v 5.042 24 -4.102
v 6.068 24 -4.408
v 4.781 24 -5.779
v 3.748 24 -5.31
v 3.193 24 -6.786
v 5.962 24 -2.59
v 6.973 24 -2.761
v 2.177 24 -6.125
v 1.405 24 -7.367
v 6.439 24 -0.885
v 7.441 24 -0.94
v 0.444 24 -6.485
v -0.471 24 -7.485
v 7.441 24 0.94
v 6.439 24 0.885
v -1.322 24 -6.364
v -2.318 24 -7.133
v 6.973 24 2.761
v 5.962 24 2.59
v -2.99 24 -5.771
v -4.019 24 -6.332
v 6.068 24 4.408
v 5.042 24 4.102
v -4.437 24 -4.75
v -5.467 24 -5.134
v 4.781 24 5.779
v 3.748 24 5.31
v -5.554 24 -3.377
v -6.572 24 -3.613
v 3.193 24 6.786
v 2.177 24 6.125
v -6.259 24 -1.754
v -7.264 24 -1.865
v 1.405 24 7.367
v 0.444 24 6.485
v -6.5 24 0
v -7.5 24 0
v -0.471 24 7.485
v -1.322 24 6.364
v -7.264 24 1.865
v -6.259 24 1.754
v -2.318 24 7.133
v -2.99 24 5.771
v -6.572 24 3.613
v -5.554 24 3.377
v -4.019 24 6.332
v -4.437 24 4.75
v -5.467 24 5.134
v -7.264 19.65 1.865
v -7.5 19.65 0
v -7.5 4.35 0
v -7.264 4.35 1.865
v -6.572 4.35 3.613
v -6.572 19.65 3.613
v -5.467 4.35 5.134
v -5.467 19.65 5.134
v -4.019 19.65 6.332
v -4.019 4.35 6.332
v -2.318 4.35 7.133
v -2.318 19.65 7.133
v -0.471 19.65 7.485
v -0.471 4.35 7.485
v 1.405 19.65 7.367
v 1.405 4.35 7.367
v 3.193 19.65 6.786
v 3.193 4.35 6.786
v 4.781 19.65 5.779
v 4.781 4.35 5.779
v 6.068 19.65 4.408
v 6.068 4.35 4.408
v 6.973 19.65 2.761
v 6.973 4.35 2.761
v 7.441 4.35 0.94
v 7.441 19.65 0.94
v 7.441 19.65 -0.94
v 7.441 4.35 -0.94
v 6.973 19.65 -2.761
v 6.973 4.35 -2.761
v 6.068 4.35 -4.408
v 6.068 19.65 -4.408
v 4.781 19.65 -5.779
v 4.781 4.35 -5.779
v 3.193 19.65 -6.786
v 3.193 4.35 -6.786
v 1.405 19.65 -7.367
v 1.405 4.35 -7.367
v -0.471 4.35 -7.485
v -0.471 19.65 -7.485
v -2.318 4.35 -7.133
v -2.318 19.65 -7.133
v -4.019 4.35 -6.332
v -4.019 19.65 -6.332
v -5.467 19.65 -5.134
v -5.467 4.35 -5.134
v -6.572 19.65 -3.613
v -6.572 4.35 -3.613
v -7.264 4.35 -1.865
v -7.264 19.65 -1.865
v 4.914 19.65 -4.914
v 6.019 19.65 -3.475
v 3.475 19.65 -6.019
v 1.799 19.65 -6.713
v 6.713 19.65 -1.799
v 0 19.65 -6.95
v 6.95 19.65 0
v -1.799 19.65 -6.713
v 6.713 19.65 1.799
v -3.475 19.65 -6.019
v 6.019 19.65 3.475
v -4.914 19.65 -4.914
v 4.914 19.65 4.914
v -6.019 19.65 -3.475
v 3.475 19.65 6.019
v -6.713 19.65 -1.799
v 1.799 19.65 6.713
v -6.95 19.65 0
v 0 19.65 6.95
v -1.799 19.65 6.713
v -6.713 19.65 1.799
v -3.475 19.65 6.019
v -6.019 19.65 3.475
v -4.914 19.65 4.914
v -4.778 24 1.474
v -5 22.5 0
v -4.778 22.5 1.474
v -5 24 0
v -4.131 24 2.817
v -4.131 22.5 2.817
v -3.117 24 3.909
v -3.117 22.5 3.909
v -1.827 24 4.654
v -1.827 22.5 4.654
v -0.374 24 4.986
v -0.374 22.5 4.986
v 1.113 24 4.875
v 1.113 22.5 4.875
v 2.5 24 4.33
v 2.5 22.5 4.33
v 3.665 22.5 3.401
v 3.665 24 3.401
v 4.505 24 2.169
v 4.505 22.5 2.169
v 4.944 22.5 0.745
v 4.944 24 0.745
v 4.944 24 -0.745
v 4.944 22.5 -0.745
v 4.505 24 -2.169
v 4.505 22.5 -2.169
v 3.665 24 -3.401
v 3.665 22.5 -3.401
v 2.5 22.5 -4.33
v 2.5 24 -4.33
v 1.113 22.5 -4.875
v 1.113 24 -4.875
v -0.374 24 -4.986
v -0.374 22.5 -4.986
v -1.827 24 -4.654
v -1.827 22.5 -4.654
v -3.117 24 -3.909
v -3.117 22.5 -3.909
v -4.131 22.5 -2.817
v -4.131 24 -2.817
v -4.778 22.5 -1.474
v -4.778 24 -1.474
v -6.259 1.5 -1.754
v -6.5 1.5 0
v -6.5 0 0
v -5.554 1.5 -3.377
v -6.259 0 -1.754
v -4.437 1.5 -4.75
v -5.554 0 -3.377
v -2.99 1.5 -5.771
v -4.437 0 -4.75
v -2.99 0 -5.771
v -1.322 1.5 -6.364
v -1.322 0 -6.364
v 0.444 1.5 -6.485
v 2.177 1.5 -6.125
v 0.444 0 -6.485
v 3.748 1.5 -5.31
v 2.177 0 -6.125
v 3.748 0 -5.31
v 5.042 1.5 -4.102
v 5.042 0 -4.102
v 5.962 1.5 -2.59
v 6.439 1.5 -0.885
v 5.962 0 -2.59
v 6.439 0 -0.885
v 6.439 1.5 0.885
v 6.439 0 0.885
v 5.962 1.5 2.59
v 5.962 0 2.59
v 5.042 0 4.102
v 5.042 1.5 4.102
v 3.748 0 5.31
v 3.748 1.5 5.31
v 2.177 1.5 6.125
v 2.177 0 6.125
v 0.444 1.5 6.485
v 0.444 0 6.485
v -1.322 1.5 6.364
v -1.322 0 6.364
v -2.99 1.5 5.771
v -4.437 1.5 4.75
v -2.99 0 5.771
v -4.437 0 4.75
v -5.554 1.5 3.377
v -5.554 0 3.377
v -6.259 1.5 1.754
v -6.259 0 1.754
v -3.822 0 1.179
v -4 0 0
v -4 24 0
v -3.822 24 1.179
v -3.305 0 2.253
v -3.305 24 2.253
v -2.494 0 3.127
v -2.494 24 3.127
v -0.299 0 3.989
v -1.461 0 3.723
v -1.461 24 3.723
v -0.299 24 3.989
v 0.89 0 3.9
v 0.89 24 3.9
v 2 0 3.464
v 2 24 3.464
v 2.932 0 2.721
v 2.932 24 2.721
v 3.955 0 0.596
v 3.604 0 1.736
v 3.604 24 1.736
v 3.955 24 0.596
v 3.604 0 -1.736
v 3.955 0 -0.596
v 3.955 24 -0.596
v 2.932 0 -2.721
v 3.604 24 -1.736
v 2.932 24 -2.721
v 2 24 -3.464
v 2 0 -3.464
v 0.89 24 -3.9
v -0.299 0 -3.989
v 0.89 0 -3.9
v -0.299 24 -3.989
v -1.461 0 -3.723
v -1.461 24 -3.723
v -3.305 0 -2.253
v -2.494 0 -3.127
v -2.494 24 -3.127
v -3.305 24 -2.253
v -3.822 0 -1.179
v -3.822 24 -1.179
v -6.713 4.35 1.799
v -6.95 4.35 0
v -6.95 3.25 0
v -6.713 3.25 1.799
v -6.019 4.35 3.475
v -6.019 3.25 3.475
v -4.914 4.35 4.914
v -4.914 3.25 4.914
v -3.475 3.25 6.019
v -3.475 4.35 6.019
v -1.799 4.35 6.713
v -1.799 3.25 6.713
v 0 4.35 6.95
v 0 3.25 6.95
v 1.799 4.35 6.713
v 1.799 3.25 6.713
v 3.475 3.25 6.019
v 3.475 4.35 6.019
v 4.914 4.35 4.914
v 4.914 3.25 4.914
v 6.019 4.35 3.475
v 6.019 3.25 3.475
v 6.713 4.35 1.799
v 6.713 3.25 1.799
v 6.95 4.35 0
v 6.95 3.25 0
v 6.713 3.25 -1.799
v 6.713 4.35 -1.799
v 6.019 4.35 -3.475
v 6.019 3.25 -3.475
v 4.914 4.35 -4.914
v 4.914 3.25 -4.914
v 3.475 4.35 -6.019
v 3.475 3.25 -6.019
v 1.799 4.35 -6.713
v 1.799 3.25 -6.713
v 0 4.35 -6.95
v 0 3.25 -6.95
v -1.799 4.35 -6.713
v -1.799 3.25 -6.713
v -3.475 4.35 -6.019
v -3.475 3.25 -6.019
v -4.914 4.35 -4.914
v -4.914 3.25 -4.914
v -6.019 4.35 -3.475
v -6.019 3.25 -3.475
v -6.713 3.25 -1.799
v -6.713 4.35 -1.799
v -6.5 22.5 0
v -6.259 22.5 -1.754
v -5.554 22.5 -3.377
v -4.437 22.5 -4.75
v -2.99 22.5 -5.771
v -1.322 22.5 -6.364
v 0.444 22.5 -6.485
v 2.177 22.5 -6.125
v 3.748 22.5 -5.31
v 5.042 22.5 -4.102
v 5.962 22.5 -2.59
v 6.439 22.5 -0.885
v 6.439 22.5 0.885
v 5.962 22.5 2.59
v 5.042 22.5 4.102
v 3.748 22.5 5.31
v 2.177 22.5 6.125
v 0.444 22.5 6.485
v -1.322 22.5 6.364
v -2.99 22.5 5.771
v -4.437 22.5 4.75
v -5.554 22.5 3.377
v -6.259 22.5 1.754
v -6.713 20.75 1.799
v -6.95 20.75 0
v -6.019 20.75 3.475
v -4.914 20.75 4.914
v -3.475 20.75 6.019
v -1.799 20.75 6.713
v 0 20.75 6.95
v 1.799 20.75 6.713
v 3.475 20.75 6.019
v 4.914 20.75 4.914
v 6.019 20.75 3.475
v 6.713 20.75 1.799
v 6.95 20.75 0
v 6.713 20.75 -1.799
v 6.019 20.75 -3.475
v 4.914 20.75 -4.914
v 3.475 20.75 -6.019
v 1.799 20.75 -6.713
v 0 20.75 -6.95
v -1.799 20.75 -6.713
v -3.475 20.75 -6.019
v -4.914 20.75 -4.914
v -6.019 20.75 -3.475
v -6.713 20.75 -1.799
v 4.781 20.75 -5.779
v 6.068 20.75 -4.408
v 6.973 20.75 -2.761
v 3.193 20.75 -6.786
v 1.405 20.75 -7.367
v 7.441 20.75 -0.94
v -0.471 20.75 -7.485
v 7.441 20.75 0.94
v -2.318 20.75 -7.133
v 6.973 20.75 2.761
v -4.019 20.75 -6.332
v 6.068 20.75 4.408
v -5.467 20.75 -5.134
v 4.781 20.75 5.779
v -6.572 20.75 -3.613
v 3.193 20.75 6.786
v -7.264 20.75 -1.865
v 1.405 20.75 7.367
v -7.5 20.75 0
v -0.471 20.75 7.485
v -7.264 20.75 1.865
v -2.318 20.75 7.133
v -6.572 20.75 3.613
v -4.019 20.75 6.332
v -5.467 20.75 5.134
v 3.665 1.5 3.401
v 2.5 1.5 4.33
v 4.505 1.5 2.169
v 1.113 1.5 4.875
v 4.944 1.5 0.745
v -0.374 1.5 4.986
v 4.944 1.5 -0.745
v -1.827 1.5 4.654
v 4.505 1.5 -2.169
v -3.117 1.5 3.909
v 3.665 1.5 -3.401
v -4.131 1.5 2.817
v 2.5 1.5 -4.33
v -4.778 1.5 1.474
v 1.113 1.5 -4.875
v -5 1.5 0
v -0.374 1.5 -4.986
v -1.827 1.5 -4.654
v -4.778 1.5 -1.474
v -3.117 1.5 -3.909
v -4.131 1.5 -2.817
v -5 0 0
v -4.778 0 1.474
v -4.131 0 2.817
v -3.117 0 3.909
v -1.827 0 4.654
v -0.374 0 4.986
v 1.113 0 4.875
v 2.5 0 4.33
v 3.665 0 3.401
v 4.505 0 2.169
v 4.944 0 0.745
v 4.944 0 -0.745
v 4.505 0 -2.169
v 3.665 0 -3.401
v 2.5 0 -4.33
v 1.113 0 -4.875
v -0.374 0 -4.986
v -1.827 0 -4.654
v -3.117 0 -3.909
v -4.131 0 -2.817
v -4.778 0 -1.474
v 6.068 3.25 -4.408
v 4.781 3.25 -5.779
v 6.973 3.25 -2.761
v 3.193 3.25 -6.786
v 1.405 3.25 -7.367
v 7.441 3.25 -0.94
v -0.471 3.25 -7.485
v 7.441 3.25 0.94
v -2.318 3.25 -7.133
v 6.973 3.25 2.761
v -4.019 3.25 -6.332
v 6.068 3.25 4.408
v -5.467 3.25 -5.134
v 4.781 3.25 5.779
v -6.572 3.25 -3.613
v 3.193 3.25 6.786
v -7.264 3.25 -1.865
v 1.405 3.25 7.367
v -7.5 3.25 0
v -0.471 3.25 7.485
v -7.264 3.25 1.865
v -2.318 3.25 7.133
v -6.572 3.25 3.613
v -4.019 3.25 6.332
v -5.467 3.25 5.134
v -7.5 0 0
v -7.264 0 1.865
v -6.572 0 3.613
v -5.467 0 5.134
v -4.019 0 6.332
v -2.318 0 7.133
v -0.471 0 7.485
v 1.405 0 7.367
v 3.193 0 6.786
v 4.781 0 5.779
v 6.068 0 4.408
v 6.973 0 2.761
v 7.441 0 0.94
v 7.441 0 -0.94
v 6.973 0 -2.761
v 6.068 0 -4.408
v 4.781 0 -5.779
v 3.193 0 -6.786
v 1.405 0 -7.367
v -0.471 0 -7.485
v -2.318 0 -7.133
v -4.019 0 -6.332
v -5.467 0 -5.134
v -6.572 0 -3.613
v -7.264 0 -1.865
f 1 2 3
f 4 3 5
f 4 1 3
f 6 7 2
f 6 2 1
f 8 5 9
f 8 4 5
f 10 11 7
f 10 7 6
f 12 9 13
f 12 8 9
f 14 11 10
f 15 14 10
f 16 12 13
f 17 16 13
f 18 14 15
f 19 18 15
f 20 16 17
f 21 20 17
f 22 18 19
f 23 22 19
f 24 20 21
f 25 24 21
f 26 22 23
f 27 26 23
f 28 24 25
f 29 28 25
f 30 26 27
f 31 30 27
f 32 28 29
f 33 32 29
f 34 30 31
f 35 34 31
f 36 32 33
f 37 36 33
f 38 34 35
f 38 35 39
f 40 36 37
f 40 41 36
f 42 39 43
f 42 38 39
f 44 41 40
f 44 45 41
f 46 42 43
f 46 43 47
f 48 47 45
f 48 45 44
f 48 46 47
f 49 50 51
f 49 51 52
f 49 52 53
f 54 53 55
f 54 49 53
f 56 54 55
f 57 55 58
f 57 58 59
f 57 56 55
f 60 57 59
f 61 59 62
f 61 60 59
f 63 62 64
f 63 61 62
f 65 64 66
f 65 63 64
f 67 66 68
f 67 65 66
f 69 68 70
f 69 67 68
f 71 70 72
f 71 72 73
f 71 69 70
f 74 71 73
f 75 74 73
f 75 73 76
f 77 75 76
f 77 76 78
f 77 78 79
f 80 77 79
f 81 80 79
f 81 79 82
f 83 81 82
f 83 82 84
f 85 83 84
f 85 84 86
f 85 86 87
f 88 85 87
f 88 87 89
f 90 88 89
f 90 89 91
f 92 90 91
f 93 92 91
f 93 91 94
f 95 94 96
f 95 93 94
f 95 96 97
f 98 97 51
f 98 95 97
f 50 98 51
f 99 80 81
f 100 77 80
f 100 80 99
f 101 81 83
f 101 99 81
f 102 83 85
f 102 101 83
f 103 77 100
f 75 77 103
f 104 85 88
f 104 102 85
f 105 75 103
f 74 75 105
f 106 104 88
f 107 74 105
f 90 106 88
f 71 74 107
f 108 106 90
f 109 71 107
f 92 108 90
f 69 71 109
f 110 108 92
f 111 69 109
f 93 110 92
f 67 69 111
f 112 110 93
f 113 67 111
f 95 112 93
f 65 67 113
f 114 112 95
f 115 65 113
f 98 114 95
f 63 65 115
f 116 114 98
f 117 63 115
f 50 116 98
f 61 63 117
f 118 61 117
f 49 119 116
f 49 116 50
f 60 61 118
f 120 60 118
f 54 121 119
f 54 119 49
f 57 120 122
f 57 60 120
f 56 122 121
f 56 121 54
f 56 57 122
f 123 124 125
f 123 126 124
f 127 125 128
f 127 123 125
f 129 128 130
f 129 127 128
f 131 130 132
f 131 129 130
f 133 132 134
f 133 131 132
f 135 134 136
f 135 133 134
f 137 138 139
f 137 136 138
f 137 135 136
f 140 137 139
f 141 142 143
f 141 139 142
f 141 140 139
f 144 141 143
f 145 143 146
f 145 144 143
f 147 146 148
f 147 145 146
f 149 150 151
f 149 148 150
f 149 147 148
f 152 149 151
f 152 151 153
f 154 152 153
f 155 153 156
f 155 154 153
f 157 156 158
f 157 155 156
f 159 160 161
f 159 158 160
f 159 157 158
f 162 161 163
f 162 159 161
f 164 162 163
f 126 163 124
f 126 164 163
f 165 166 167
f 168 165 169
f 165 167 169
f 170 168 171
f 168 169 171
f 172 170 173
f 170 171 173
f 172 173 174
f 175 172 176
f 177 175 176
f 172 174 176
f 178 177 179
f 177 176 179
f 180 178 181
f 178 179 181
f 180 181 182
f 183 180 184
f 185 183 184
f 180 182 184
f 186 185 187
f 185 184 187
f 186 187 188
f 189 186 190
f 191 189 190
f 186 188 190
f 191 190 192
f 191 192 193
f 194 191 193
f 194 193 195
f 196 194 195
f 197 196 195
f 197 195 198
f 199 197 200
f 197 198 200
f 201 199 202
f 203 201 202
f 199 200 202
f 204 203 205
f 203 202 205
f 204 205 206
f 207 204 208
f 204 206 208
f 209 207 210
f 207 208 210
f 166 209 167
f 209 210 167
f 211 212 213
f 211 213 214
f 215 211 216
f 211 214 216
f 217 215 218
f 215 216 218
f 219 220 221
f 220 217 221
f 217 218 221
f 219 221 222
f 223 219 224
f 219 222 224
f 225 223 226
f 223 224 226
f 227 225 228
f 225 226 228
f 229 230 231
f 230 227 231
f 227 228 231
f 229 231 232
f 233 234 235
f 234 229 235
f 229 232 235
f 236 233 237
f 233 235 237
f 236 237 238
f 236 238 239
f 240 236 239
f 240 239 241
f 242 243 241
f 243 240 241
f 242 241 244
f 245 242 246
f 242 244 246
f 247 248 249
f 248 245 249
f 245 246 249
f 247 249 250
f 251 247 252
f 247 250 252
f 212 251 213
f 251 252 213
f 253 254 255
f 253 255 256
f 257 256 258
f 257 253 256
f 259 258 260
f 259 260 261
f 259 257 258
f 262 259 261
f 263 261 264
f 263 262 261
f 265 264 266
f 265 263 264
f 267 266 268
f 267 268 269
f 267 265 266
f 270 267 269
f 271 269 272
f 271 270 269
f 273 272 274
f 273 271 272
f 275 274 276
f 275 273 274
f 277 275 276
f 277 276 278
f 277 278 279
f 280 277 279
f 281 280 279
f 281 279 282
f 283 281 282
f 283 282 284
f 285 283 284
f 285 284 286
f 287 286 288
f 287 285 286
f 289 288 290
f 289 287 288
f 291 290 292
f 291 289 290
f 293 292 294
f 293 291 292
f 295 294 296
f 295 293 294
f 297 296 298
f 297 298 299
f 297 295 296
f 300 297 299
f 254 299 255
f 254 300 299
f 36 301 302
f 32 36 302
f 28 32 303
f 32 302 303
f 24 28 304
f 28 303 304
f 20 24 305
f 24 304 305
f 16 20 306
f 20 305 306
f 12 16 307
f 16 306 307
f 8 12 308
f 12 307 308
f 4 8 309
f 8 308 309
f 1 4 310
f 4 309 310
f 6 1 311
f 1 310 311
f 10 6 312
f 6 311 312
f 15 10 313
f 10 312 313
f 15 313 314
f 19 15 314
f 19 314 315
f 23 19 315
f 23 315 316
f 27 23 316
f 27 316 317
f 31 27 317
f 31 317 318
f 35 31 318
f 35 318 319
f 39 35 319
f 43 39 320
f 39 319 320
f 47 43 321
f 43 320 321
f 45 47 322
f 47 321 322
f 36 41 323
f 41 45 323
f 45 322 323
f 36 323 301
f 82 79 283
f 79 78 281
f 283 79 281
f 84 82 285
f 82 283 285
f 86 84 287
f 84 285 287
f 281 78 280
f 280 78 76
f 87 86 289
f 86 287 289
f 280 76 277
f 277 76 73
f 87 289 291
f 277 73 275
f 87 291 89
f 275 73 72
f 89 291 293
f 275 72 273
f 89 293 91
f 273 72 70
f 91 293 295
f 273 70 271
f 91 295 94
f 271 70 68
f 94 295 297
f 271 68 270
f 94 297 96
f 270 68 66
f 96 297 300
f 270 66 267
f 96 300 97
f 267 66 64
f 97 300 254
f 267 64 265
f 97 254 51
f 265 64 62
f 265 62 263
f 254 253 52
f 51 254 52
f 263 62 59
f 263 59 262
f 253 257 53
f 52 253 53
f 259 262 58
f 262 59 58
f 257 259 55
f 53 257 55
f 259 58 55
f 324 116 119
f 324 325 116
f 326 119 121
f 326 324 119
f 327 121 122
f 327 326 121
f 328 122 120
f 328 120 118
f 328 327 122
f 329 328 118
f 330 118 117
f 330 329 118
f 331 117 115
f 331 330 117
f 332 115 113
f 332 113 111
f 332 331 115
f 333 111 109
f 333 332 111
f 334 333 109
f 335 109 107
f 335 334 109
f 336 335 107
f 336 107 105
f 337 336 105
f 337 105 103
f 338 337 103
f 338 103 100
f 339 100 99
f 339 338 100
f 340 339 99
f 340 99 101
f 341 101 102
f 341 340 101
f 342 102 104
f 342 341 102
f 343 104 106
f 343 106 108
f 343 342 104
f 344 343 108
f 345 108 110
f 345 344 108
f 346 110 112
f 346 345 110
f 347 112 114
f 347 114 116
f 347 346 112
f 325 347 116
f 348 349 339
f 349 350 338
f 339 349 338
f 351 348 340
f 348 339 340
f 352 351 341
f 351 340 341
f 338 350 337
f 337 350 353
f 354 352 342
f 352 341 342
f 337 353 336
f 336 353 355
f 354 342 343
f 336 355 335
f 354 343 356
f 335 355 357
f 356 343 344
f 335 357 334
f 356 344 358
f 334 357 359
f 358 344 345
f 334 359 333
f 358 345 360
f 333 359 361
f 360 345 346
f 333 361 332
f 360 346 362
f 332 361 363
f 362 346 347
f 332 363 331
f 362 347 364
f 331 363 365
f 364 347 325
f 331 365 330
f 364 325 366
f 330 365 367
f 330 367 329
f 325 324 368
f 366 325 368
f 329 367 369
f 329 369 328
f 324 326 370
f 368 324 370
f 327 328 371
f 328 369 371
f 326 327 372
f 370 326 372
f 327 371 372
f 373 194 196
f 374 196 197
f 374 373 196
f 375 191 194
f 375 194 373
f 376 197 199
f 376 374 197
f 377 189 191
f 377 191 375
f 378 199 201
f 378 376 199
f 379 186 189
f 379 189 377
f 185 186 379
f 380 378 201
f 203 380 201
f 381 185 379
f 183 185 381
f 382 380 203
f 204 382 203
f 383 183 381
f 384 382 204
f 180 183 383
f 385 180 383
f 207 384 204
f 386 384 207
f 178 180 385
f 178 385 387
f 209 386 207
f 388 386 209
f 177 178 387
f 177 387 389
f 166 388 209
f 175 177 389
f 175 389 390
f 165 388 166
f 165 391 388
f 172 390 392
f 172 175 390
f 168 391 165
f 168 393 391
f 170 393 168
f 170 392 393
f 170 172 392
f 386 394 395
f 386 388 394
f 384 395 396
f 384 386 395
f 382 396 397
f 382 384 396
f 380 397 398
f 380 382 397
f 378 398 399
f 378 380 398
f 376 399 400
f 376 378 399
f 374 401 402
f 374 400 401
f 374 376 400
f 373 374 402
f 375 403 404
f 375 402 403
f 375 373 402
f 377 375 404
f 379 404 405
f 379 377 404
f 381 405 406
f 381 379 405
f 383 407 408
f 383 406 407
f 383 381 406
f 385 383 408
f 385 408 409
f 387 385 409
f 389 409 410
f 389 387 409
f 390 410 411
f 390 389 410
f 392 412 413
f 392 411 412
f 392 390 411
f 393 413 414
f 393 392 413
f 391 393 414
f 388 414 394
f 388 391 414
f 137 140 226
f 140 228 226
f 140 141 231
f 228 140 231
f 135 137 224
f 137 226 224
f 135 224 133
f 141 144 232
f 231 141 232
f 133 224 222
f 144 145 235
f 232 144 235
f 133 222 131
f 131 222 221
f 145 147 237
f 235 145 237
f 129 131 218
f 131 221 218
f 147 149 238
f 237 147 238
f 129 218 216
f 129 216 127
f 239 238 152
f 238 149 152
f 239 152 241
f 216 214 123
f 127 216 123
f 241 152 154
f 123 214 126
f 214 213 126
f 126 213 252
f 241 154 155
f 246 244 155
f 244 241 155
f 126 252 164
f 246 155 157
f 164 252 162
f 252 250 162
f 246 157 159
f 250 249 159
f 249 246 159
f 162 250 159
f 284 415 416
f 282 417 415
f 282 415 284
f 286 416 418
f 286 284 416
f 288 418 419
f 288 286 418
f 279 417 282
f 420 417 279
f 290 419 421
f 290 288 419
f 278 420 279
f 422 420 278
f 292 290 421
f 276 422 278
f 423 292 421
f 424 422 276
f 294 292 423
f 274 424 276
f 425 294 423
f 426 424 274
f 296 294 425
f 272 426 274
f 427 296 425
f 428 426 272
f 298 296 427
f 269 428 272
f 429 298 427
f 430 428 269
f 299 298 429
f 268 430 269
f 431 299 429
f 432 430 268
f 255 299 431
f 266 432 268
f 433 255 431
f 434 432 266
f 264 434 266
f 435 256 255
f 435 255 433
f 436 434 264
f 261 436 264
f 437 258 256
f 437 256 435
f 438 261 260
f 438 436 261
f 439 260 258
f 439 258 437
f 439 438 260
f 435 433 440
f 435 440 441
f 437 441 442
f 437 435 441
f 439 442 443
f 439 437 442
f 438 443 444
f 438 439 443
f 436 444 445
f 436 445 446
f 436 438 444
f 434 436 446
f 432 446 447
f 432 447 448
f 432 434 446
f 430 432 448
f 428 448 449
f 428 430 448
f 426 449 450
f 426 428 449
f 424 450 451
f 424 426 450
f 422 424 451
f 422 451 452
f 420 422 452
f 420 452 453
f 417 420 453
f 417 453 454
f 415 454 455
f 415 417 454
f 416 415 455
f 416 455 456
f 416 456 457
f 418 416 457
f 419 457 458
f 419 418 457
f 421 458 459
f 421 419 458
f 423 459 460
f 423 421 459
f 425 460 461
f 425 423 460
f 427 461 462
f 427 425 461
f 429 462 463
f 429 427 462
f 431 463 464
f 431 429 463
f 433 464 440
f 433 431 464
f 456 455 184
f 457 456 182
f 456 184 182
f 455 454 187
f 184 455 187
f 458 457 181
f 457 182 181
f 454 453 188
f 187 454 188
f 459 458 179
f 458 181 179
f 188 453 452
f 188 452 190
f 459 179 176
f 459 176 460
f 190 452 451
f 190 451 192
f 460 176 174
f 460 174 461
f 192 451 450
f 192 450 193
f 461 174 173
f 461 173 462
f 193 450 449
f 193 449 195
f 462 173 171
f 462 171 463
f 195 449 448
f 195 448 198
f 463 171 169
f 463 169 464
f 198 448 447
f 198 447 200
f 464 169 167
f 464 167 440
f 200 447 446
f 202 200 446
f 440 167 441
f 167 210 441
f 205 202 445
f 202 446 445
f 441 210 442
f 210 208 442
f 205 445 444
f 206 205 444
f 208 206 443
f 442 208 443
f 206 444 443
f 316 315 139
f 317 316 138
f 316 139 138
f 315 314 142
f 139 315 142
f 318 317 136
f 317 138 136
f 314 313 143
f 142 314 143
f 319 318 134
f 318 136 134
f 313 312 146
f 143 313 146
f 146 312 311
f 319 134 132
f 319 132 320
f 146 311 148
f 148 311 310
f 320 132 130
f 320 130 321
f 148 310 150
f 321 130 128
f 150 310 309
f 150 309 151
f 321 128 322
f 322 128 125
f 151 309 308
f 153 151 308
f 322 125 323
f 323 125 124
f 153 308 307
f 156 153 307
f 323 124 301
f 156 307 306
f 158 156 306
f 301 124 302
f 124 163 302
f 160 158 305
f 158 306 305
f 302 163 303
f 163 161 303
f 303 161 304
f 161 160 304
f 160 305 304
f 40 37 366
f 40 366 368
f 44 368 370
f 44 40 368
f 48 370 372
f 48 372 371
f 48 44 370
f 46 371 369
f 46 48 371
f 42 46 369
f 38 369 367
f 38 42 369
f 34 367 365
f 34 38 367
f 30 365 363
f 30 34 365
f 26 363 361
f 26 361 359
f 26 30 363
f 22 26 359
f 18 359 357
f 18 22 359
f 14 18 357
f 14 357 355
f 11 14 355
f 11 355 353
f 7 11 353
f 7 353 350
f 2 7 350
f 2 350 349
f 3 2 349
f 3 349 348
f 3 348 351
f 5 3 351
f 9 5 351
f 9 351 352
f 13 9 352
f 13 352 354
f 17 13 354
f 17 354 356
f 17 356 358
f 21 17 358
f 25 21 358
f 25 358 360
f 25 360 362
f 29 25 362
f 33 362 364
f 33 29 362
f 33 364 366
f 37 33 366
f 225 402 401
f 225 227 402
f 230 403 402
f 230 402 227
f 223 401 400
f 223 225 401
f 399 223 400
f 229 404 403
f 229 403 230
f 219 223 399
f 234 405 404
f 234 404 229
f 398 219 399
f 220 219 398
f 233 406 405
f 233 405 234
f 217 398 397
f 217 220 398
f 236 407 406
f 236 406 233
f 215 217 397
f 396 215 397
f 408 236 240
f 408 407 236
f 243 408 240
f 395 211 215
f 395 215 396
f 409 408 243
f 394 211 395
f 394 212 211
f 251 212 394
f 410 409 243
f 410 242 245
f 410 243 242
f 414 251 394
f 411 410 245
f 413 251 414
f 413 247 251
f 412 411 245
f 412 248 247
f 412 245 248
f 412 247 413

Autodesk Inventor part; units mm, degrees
ref_plane "YZ Plane" through (0, 0, 0) normal (1, 0, 0) x (0, 1, 0)
ref_plane "XZ Plane" through (0, 0, 0) normal (0, 1, 0) x (-1, 0, 0)
ref_plane "XY Plane" through (0, 0, 0) normal (0, 0, 1) x (1, 0, 0)
sketch "Esboço1" plane through (0, 0, 0) normal (0, 0, 1) x (1, 0, 0)
  line L0 (-7.5, 0) -> (-7.5, 3.25)
  line L1 (-7.5, 3.25) -> (-6.95, 3.25)
  line L2 (-6.95, 3.25) -> (-6.95, 4.35)
  line L3 (-6.95, 4.35) -> (-7.5, 4.35)
  line L4 (-7.5, 4.35) -> (-7.5, 19.65)
  line L5 (-7.5, 19.65) -> (-6.95, 19.65)
  line L6 (-6.95, 19.65) -> (-6.95, 20.75)
  line L7 (-6.95, 20.75) -> (-7.5, 20.75)
  line L8 (-7.5, 20.75) -> (-7.5, 24)
  line L9 (-7.5, 24) -> (-6.5, 24)
  line L10 (-7.5, 0) -> (-6.5, 0)
  line L11 (-6.5, 0) -> (0, 0) construction
  line L12 (0, 0) -> (0, 24) construction
  line L13 (0, 24) -> (-6.5, 24) construction
  line L14 (-6.5, 24) -> (-6.5, 0)
  dimension "d0" = 6.5
  dimension "d1" = 24
  dimension "d4" = 0.55
  dimension "d5" = 1.1
  dimension "d6" = 1.1
  dimension "d8" = 1
  dimension "d26" = 17.5
  dimension "d27" = 3.25
sketch "Esboço3" plane through (0, 0, 0) normal (0, 0, 1) x (1, 0, 0)
  line L0 (0, 24) -> (0, 0) construction
  line L1 (0, 24) -> (0, 35.5) construction
  line L2 (0, 0) -> (0, 1.5) construction
  line L3 (-4, 0) -> (-4, 24)
  line L4 (-4, 0) -> (-5, 0)
  line L5 (-5, 24) -> (-4, 24)
  line L6 (-5, 1.5) -> (-6.5, 1.5)
  line L7 (-6.5, 1.5) -> (-6.5, 22.5)
  line L8 (-6.5, 22.5) -> (-5, 22.5)
  line L9 (-5, 0) -> (-5, 1.5)
  line L10 (-5, 22.5) -> (-5, 24)
  dimension "d28" = 24
  dimension "d30" = 4
  dimension "d31" = 21
  dimension "d32" = 24
  dimension "d33" = 1.5
  dimension "d34" = 2.5
  dimension "d36" = 1
  dimension "d37" = 1
revolve "Revolução1" add sketch "Esboço3" angle 360 about axis through (0, 24, 0) along (0, -1, 0)
revolve "Revolução2" add sketch "Esboço1" angle 360 about axis through (0, 0, 0) along (0, 1, 0)
equation "\"d6\" = d5"
equation "\"d27\" = -0.5 * d26 + 0.5 * d1"
equation "\"d33\" = -0.5 * d31 + 0.5 * d32"
equation "\"d37\" = d36"
properties part number "rolamento_linear_lm8uu.iam"
